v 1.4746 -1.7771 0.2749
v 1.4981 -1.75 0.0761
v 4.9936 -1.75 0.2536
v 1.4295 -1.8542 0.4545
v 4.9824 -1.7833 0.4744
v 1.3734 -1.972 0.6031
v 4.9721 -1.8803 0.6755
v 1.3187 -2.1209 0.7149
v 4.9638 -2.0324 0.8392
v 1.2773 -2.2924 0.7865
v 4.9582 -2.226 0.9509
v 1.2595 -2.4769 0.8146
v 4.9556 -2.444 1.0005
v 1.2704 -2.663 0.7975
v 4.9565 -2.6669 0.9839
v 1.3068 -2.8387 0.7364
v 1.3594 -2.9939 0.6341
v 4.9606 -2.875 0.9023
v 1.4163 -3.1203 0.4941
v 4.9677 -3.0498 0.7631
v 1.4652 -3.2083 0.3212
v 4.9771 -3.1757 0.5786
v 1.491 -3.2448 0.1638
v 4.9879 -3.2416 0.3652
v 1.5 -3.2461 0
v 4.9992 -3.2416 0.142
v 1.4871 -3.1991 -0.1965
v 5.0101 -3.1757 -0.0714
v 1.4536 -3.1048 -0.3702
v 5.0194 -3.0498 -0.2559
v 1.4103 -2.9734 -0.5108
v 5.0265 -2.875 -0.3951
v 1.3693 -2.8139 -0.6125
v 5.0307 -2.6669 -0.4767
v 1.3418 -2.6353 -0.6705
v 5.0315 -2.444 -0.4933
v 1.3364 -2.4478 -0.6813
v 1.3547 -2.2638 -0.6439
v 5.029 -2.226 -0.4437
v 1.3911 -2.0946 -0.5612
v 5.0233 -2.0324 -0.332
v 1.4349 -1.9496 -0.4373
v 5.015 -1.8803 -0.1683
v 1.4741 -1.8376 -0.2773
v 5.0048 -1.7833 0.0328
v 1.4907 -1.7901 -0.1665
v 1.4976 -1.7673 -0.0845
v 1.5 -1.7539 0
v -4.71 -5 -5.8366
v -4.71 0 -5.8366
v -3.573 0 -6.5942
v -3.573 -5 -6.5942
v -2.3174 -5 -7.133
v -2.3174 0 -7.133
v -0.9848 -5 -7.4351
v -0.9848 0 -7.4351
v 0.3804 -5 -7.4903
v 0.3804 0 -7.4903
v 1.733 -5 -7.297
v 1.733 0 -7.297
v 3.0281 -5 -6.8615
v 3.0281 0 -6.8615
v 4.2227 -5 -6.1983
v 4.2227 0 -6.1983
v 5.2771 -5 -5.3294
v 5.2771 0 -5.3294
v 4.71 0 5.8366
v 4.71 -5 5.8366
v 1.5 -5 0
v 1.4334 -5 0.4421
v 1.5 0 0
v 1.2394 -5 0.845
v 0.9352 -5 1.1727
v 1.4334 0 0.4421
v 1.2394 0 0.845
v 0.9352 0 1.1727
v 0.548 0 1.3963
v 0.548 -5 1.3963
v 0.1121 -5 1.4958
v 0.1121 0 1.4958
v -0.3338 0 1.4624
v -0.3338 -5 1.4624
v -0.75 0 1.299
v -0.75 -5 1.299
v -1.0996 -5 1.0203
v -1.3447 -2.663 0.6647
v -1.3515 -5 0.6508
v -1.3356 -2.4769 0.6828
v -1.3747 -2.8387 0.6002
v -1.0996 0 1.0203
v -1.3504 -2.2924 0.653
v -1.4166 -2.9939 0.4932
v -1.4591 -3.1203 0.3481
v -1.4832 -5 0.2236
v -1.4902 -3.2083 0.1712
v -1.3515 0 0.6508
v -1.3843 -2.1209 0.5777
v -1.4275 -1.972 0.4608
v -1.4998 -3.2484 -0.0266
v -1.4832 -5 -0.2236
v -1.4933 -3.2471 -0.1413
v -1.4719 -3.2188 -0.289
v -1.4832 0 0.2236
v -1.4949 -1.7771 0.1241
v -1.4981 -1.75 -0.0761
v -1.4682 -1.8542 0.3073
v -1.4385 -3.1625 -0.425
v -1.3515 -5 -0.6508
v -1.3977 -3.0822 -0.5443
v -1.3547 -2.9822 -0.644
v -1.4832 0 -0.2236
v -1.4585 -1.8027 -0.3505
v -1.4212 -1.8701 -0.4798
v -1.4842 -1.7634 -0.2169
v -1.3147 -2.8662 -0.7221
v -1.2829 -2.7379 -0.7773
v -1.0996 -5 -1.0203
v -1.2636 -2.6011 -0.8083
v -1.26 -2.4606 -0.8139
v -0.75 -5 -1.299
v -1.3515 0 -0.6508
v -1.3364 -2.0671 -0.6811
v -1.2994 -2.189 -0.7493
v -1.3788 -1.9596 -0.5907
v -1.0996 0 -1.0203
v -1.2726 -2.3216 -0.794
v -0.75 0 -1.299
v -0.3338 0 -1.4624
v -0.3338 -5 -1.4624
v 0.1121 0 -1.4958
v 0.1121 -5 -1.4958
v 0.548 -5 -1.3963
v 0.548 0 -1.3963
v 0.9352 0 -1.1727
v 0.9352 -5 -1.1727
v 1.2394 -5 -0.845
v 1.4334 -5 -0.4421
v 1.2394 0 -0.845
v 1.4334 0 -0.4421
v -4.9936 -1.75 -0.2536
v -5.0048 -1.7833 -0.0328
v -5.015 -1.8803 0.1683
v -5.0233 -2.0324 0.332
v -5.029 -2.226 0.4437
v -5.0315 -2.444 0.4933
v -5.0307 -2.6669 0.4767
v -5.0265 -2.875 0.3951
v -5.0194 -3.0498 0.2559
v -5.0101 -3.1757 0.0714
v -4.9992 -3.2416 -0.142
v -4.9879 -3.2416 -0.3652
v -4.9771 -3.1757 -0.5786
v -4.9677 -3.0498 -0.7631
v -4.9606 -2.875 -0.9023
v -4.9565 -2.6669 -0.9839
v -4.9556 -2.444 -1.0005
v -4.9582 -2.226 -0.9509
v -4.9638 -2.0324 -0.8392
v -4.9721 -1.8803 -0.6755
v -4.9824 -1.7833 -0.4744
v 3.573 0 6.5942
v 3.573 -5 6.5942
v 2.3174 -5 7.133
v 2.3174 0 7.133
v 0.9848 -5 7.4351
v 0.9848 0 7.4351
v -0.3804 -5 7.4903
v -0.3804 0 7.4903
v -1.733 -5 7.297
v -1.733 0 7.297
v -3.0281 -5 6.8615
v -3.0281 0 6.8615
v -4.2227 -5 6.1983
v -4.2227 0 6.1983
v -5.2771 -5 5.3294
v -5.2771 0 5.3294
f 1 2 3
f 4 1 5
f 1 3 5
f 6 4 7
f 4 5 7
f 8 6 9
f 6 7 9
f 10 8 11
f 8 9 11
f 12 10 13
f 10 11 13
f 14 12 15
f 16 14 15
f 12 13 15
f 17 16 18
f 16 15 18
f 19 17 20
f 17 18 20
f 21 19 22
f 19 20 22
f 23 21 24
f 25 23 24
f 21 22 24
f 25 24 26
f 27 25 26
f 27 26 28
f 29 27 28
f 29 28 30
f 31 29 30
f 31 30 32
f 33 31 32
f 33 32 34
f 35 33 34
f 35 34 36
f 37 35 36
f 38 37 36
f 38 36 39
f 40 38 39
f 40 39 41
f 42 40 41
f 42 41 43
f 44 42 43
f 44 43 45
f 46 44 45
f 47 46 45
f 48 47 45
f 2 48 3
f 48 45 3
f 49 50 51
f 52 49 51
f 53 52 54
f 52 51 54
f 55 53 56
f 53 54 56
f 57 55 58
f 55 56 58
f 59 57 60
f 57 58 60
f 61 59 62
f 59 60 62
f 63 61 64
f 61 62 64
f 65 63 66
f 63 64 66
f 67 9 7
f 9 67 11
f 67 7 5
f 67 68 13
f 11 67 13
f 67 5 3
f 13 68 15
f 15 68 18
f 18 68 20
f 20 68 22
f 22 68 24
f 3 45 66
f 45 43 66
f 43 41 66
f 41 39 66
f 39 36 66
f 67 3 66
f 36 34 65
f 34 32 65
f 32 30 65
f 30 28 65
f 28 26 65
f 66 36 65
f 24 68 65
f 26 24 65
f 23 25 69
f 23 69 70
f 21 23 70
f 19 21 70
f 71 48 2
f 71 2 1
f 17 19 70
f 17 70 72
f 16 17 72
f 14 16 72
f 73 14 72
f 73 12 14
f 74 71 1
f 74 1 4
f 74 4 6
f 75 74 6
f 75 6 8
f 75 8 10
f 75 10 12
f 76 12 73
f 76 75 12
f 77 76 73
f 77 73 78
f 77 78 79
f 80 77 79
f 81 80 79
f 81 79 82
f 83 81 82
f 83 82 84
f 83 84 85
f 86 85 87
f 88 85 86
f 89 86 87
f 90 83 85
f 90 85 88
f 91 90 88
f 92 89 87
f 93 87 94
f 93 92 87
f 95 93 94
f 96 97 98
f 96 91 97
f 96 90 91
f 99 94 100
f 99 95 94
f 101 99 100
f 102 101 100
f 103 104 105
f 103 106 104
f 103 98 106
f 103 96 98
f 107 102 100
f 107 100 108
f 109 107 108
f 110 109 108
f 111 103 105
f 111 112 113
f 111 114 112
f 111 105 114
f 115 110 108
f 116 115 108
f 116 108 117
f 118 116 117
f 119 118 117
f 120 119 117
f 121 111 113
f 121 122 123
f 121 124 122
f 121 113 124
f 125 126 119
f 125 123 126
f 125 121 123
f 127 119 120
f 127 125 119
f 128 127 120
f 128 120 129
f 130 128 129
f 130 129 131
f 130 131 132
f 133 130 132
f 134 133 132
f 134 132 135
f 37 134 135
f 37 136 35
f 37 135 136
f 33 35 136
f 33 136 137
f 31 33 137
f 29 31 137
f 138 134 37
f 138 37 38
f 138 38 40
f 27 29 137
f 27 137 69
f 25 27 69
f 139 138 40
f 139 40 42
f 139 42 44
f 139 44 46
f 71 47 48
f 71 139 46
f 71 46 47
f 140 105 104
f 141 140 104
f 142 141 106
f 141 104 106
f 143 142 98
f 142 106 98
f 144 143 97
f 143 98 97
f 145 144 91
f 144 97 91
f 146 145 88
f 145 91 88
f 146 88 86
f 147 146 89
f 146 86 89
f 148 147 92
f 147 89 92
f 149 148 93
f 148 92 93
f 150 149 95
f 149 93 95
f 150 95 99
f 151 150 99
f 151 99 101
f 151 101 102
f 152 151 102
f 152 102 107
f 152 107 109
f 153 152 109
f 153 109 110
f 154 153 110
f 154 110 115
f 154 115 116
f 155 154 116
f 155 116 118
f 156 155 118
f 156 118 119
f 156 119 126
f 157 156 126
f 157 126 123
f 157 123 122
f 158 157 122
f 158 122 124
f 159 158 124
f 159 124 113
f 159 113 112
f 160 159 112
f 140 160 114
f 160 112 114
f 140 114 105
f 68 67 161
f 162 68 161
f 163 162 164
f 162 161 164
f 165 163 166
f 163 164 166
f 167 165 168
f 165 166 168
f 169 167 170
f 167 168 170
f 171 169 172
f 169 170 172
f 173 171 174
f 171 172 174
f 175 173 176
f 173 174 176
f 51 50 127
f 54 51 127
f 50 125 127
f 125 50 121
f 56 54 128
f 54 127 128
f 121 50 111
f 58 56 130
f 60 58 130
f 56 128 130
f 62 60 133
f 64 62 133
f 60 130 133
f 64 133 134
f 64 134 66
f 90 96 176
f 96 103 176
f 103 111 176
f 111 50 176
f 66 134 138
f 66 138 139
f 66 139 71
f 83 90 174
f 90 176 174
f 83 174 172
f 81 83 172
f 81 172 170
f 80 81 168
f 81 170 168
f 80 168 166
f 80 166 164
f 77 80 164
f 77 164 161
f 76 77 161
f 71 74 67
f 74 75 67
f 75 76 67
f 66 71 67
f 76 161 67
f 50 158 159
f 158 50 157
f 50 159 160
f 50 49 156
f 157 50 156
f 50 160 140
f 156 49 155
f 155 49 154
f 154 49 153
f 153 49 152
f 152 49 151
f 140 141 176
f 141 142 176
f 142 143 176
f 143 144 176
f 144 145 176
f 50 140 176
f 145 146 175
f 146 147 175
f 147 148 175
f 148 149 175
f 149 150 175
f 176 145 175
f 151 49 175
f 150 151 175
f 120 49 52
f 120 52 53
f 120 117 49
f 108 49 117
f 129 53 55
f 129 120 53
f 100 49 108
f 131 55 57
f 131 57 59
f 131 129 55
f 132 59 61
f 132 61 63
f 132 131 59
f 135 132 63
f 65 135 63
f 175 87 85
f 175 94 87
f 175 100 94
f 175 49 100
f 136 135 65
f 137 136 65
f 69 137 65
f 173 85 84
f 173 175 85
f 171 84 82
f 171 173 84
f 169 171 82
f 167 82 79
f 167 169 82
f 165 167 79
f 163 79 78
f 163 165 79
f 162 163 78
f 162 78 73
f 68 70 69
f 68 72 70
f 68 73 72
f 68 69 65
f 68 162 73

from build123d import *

# Parameters (mm, degrees)
F0_R     = 7.5
F0_R_2   = 1.5
F1_DEPTH = 5
F3_DEPTH = 25
F4_R     = 0.75
F5_DEPTH = 25


with BuildPart() as f1:
    # F0 (on Front) → F1 (new body)
    with BuildSketch(Plane.XZ):
        Circle(F0_R)
        Circle(F0_R_2, mode=Mode.SUBTRACT)
    extrude(amount=F1_DEPTH)

    # F2 (on face) → F3 (cut)
    with BuildSketch(Plane.XZ.offset(5)):
        Polygon((7.705039, 6.243331), (4.710033, 5.836573), (5.342667, -6.620519), (8.805699, -9.096223), (11.449249, 0), align=None)
        Polygon((-4.710033, -5.836573), (-5.342667, 6.620519), (-10.334909, 6.971451), (-9.518318, -9.107922), align=None)
    extrude(amount=-F3_DEPTH, mode=Mode.SUBTRACT)

    # F4 (on face) → F5 (cut)
    with BuildSketch(Plane(origin=(4.993565, 0, 0.253598), x_dir=(0, 1, 0), z_dir=(0.998713, 0, 0.05072))):
        with Locations((-2.5, 0)):
            Circle(F4_R)
    extrude(amount=-F5_DEPTH, mode=Mode.SUBTRACT)


solid = f1.part
